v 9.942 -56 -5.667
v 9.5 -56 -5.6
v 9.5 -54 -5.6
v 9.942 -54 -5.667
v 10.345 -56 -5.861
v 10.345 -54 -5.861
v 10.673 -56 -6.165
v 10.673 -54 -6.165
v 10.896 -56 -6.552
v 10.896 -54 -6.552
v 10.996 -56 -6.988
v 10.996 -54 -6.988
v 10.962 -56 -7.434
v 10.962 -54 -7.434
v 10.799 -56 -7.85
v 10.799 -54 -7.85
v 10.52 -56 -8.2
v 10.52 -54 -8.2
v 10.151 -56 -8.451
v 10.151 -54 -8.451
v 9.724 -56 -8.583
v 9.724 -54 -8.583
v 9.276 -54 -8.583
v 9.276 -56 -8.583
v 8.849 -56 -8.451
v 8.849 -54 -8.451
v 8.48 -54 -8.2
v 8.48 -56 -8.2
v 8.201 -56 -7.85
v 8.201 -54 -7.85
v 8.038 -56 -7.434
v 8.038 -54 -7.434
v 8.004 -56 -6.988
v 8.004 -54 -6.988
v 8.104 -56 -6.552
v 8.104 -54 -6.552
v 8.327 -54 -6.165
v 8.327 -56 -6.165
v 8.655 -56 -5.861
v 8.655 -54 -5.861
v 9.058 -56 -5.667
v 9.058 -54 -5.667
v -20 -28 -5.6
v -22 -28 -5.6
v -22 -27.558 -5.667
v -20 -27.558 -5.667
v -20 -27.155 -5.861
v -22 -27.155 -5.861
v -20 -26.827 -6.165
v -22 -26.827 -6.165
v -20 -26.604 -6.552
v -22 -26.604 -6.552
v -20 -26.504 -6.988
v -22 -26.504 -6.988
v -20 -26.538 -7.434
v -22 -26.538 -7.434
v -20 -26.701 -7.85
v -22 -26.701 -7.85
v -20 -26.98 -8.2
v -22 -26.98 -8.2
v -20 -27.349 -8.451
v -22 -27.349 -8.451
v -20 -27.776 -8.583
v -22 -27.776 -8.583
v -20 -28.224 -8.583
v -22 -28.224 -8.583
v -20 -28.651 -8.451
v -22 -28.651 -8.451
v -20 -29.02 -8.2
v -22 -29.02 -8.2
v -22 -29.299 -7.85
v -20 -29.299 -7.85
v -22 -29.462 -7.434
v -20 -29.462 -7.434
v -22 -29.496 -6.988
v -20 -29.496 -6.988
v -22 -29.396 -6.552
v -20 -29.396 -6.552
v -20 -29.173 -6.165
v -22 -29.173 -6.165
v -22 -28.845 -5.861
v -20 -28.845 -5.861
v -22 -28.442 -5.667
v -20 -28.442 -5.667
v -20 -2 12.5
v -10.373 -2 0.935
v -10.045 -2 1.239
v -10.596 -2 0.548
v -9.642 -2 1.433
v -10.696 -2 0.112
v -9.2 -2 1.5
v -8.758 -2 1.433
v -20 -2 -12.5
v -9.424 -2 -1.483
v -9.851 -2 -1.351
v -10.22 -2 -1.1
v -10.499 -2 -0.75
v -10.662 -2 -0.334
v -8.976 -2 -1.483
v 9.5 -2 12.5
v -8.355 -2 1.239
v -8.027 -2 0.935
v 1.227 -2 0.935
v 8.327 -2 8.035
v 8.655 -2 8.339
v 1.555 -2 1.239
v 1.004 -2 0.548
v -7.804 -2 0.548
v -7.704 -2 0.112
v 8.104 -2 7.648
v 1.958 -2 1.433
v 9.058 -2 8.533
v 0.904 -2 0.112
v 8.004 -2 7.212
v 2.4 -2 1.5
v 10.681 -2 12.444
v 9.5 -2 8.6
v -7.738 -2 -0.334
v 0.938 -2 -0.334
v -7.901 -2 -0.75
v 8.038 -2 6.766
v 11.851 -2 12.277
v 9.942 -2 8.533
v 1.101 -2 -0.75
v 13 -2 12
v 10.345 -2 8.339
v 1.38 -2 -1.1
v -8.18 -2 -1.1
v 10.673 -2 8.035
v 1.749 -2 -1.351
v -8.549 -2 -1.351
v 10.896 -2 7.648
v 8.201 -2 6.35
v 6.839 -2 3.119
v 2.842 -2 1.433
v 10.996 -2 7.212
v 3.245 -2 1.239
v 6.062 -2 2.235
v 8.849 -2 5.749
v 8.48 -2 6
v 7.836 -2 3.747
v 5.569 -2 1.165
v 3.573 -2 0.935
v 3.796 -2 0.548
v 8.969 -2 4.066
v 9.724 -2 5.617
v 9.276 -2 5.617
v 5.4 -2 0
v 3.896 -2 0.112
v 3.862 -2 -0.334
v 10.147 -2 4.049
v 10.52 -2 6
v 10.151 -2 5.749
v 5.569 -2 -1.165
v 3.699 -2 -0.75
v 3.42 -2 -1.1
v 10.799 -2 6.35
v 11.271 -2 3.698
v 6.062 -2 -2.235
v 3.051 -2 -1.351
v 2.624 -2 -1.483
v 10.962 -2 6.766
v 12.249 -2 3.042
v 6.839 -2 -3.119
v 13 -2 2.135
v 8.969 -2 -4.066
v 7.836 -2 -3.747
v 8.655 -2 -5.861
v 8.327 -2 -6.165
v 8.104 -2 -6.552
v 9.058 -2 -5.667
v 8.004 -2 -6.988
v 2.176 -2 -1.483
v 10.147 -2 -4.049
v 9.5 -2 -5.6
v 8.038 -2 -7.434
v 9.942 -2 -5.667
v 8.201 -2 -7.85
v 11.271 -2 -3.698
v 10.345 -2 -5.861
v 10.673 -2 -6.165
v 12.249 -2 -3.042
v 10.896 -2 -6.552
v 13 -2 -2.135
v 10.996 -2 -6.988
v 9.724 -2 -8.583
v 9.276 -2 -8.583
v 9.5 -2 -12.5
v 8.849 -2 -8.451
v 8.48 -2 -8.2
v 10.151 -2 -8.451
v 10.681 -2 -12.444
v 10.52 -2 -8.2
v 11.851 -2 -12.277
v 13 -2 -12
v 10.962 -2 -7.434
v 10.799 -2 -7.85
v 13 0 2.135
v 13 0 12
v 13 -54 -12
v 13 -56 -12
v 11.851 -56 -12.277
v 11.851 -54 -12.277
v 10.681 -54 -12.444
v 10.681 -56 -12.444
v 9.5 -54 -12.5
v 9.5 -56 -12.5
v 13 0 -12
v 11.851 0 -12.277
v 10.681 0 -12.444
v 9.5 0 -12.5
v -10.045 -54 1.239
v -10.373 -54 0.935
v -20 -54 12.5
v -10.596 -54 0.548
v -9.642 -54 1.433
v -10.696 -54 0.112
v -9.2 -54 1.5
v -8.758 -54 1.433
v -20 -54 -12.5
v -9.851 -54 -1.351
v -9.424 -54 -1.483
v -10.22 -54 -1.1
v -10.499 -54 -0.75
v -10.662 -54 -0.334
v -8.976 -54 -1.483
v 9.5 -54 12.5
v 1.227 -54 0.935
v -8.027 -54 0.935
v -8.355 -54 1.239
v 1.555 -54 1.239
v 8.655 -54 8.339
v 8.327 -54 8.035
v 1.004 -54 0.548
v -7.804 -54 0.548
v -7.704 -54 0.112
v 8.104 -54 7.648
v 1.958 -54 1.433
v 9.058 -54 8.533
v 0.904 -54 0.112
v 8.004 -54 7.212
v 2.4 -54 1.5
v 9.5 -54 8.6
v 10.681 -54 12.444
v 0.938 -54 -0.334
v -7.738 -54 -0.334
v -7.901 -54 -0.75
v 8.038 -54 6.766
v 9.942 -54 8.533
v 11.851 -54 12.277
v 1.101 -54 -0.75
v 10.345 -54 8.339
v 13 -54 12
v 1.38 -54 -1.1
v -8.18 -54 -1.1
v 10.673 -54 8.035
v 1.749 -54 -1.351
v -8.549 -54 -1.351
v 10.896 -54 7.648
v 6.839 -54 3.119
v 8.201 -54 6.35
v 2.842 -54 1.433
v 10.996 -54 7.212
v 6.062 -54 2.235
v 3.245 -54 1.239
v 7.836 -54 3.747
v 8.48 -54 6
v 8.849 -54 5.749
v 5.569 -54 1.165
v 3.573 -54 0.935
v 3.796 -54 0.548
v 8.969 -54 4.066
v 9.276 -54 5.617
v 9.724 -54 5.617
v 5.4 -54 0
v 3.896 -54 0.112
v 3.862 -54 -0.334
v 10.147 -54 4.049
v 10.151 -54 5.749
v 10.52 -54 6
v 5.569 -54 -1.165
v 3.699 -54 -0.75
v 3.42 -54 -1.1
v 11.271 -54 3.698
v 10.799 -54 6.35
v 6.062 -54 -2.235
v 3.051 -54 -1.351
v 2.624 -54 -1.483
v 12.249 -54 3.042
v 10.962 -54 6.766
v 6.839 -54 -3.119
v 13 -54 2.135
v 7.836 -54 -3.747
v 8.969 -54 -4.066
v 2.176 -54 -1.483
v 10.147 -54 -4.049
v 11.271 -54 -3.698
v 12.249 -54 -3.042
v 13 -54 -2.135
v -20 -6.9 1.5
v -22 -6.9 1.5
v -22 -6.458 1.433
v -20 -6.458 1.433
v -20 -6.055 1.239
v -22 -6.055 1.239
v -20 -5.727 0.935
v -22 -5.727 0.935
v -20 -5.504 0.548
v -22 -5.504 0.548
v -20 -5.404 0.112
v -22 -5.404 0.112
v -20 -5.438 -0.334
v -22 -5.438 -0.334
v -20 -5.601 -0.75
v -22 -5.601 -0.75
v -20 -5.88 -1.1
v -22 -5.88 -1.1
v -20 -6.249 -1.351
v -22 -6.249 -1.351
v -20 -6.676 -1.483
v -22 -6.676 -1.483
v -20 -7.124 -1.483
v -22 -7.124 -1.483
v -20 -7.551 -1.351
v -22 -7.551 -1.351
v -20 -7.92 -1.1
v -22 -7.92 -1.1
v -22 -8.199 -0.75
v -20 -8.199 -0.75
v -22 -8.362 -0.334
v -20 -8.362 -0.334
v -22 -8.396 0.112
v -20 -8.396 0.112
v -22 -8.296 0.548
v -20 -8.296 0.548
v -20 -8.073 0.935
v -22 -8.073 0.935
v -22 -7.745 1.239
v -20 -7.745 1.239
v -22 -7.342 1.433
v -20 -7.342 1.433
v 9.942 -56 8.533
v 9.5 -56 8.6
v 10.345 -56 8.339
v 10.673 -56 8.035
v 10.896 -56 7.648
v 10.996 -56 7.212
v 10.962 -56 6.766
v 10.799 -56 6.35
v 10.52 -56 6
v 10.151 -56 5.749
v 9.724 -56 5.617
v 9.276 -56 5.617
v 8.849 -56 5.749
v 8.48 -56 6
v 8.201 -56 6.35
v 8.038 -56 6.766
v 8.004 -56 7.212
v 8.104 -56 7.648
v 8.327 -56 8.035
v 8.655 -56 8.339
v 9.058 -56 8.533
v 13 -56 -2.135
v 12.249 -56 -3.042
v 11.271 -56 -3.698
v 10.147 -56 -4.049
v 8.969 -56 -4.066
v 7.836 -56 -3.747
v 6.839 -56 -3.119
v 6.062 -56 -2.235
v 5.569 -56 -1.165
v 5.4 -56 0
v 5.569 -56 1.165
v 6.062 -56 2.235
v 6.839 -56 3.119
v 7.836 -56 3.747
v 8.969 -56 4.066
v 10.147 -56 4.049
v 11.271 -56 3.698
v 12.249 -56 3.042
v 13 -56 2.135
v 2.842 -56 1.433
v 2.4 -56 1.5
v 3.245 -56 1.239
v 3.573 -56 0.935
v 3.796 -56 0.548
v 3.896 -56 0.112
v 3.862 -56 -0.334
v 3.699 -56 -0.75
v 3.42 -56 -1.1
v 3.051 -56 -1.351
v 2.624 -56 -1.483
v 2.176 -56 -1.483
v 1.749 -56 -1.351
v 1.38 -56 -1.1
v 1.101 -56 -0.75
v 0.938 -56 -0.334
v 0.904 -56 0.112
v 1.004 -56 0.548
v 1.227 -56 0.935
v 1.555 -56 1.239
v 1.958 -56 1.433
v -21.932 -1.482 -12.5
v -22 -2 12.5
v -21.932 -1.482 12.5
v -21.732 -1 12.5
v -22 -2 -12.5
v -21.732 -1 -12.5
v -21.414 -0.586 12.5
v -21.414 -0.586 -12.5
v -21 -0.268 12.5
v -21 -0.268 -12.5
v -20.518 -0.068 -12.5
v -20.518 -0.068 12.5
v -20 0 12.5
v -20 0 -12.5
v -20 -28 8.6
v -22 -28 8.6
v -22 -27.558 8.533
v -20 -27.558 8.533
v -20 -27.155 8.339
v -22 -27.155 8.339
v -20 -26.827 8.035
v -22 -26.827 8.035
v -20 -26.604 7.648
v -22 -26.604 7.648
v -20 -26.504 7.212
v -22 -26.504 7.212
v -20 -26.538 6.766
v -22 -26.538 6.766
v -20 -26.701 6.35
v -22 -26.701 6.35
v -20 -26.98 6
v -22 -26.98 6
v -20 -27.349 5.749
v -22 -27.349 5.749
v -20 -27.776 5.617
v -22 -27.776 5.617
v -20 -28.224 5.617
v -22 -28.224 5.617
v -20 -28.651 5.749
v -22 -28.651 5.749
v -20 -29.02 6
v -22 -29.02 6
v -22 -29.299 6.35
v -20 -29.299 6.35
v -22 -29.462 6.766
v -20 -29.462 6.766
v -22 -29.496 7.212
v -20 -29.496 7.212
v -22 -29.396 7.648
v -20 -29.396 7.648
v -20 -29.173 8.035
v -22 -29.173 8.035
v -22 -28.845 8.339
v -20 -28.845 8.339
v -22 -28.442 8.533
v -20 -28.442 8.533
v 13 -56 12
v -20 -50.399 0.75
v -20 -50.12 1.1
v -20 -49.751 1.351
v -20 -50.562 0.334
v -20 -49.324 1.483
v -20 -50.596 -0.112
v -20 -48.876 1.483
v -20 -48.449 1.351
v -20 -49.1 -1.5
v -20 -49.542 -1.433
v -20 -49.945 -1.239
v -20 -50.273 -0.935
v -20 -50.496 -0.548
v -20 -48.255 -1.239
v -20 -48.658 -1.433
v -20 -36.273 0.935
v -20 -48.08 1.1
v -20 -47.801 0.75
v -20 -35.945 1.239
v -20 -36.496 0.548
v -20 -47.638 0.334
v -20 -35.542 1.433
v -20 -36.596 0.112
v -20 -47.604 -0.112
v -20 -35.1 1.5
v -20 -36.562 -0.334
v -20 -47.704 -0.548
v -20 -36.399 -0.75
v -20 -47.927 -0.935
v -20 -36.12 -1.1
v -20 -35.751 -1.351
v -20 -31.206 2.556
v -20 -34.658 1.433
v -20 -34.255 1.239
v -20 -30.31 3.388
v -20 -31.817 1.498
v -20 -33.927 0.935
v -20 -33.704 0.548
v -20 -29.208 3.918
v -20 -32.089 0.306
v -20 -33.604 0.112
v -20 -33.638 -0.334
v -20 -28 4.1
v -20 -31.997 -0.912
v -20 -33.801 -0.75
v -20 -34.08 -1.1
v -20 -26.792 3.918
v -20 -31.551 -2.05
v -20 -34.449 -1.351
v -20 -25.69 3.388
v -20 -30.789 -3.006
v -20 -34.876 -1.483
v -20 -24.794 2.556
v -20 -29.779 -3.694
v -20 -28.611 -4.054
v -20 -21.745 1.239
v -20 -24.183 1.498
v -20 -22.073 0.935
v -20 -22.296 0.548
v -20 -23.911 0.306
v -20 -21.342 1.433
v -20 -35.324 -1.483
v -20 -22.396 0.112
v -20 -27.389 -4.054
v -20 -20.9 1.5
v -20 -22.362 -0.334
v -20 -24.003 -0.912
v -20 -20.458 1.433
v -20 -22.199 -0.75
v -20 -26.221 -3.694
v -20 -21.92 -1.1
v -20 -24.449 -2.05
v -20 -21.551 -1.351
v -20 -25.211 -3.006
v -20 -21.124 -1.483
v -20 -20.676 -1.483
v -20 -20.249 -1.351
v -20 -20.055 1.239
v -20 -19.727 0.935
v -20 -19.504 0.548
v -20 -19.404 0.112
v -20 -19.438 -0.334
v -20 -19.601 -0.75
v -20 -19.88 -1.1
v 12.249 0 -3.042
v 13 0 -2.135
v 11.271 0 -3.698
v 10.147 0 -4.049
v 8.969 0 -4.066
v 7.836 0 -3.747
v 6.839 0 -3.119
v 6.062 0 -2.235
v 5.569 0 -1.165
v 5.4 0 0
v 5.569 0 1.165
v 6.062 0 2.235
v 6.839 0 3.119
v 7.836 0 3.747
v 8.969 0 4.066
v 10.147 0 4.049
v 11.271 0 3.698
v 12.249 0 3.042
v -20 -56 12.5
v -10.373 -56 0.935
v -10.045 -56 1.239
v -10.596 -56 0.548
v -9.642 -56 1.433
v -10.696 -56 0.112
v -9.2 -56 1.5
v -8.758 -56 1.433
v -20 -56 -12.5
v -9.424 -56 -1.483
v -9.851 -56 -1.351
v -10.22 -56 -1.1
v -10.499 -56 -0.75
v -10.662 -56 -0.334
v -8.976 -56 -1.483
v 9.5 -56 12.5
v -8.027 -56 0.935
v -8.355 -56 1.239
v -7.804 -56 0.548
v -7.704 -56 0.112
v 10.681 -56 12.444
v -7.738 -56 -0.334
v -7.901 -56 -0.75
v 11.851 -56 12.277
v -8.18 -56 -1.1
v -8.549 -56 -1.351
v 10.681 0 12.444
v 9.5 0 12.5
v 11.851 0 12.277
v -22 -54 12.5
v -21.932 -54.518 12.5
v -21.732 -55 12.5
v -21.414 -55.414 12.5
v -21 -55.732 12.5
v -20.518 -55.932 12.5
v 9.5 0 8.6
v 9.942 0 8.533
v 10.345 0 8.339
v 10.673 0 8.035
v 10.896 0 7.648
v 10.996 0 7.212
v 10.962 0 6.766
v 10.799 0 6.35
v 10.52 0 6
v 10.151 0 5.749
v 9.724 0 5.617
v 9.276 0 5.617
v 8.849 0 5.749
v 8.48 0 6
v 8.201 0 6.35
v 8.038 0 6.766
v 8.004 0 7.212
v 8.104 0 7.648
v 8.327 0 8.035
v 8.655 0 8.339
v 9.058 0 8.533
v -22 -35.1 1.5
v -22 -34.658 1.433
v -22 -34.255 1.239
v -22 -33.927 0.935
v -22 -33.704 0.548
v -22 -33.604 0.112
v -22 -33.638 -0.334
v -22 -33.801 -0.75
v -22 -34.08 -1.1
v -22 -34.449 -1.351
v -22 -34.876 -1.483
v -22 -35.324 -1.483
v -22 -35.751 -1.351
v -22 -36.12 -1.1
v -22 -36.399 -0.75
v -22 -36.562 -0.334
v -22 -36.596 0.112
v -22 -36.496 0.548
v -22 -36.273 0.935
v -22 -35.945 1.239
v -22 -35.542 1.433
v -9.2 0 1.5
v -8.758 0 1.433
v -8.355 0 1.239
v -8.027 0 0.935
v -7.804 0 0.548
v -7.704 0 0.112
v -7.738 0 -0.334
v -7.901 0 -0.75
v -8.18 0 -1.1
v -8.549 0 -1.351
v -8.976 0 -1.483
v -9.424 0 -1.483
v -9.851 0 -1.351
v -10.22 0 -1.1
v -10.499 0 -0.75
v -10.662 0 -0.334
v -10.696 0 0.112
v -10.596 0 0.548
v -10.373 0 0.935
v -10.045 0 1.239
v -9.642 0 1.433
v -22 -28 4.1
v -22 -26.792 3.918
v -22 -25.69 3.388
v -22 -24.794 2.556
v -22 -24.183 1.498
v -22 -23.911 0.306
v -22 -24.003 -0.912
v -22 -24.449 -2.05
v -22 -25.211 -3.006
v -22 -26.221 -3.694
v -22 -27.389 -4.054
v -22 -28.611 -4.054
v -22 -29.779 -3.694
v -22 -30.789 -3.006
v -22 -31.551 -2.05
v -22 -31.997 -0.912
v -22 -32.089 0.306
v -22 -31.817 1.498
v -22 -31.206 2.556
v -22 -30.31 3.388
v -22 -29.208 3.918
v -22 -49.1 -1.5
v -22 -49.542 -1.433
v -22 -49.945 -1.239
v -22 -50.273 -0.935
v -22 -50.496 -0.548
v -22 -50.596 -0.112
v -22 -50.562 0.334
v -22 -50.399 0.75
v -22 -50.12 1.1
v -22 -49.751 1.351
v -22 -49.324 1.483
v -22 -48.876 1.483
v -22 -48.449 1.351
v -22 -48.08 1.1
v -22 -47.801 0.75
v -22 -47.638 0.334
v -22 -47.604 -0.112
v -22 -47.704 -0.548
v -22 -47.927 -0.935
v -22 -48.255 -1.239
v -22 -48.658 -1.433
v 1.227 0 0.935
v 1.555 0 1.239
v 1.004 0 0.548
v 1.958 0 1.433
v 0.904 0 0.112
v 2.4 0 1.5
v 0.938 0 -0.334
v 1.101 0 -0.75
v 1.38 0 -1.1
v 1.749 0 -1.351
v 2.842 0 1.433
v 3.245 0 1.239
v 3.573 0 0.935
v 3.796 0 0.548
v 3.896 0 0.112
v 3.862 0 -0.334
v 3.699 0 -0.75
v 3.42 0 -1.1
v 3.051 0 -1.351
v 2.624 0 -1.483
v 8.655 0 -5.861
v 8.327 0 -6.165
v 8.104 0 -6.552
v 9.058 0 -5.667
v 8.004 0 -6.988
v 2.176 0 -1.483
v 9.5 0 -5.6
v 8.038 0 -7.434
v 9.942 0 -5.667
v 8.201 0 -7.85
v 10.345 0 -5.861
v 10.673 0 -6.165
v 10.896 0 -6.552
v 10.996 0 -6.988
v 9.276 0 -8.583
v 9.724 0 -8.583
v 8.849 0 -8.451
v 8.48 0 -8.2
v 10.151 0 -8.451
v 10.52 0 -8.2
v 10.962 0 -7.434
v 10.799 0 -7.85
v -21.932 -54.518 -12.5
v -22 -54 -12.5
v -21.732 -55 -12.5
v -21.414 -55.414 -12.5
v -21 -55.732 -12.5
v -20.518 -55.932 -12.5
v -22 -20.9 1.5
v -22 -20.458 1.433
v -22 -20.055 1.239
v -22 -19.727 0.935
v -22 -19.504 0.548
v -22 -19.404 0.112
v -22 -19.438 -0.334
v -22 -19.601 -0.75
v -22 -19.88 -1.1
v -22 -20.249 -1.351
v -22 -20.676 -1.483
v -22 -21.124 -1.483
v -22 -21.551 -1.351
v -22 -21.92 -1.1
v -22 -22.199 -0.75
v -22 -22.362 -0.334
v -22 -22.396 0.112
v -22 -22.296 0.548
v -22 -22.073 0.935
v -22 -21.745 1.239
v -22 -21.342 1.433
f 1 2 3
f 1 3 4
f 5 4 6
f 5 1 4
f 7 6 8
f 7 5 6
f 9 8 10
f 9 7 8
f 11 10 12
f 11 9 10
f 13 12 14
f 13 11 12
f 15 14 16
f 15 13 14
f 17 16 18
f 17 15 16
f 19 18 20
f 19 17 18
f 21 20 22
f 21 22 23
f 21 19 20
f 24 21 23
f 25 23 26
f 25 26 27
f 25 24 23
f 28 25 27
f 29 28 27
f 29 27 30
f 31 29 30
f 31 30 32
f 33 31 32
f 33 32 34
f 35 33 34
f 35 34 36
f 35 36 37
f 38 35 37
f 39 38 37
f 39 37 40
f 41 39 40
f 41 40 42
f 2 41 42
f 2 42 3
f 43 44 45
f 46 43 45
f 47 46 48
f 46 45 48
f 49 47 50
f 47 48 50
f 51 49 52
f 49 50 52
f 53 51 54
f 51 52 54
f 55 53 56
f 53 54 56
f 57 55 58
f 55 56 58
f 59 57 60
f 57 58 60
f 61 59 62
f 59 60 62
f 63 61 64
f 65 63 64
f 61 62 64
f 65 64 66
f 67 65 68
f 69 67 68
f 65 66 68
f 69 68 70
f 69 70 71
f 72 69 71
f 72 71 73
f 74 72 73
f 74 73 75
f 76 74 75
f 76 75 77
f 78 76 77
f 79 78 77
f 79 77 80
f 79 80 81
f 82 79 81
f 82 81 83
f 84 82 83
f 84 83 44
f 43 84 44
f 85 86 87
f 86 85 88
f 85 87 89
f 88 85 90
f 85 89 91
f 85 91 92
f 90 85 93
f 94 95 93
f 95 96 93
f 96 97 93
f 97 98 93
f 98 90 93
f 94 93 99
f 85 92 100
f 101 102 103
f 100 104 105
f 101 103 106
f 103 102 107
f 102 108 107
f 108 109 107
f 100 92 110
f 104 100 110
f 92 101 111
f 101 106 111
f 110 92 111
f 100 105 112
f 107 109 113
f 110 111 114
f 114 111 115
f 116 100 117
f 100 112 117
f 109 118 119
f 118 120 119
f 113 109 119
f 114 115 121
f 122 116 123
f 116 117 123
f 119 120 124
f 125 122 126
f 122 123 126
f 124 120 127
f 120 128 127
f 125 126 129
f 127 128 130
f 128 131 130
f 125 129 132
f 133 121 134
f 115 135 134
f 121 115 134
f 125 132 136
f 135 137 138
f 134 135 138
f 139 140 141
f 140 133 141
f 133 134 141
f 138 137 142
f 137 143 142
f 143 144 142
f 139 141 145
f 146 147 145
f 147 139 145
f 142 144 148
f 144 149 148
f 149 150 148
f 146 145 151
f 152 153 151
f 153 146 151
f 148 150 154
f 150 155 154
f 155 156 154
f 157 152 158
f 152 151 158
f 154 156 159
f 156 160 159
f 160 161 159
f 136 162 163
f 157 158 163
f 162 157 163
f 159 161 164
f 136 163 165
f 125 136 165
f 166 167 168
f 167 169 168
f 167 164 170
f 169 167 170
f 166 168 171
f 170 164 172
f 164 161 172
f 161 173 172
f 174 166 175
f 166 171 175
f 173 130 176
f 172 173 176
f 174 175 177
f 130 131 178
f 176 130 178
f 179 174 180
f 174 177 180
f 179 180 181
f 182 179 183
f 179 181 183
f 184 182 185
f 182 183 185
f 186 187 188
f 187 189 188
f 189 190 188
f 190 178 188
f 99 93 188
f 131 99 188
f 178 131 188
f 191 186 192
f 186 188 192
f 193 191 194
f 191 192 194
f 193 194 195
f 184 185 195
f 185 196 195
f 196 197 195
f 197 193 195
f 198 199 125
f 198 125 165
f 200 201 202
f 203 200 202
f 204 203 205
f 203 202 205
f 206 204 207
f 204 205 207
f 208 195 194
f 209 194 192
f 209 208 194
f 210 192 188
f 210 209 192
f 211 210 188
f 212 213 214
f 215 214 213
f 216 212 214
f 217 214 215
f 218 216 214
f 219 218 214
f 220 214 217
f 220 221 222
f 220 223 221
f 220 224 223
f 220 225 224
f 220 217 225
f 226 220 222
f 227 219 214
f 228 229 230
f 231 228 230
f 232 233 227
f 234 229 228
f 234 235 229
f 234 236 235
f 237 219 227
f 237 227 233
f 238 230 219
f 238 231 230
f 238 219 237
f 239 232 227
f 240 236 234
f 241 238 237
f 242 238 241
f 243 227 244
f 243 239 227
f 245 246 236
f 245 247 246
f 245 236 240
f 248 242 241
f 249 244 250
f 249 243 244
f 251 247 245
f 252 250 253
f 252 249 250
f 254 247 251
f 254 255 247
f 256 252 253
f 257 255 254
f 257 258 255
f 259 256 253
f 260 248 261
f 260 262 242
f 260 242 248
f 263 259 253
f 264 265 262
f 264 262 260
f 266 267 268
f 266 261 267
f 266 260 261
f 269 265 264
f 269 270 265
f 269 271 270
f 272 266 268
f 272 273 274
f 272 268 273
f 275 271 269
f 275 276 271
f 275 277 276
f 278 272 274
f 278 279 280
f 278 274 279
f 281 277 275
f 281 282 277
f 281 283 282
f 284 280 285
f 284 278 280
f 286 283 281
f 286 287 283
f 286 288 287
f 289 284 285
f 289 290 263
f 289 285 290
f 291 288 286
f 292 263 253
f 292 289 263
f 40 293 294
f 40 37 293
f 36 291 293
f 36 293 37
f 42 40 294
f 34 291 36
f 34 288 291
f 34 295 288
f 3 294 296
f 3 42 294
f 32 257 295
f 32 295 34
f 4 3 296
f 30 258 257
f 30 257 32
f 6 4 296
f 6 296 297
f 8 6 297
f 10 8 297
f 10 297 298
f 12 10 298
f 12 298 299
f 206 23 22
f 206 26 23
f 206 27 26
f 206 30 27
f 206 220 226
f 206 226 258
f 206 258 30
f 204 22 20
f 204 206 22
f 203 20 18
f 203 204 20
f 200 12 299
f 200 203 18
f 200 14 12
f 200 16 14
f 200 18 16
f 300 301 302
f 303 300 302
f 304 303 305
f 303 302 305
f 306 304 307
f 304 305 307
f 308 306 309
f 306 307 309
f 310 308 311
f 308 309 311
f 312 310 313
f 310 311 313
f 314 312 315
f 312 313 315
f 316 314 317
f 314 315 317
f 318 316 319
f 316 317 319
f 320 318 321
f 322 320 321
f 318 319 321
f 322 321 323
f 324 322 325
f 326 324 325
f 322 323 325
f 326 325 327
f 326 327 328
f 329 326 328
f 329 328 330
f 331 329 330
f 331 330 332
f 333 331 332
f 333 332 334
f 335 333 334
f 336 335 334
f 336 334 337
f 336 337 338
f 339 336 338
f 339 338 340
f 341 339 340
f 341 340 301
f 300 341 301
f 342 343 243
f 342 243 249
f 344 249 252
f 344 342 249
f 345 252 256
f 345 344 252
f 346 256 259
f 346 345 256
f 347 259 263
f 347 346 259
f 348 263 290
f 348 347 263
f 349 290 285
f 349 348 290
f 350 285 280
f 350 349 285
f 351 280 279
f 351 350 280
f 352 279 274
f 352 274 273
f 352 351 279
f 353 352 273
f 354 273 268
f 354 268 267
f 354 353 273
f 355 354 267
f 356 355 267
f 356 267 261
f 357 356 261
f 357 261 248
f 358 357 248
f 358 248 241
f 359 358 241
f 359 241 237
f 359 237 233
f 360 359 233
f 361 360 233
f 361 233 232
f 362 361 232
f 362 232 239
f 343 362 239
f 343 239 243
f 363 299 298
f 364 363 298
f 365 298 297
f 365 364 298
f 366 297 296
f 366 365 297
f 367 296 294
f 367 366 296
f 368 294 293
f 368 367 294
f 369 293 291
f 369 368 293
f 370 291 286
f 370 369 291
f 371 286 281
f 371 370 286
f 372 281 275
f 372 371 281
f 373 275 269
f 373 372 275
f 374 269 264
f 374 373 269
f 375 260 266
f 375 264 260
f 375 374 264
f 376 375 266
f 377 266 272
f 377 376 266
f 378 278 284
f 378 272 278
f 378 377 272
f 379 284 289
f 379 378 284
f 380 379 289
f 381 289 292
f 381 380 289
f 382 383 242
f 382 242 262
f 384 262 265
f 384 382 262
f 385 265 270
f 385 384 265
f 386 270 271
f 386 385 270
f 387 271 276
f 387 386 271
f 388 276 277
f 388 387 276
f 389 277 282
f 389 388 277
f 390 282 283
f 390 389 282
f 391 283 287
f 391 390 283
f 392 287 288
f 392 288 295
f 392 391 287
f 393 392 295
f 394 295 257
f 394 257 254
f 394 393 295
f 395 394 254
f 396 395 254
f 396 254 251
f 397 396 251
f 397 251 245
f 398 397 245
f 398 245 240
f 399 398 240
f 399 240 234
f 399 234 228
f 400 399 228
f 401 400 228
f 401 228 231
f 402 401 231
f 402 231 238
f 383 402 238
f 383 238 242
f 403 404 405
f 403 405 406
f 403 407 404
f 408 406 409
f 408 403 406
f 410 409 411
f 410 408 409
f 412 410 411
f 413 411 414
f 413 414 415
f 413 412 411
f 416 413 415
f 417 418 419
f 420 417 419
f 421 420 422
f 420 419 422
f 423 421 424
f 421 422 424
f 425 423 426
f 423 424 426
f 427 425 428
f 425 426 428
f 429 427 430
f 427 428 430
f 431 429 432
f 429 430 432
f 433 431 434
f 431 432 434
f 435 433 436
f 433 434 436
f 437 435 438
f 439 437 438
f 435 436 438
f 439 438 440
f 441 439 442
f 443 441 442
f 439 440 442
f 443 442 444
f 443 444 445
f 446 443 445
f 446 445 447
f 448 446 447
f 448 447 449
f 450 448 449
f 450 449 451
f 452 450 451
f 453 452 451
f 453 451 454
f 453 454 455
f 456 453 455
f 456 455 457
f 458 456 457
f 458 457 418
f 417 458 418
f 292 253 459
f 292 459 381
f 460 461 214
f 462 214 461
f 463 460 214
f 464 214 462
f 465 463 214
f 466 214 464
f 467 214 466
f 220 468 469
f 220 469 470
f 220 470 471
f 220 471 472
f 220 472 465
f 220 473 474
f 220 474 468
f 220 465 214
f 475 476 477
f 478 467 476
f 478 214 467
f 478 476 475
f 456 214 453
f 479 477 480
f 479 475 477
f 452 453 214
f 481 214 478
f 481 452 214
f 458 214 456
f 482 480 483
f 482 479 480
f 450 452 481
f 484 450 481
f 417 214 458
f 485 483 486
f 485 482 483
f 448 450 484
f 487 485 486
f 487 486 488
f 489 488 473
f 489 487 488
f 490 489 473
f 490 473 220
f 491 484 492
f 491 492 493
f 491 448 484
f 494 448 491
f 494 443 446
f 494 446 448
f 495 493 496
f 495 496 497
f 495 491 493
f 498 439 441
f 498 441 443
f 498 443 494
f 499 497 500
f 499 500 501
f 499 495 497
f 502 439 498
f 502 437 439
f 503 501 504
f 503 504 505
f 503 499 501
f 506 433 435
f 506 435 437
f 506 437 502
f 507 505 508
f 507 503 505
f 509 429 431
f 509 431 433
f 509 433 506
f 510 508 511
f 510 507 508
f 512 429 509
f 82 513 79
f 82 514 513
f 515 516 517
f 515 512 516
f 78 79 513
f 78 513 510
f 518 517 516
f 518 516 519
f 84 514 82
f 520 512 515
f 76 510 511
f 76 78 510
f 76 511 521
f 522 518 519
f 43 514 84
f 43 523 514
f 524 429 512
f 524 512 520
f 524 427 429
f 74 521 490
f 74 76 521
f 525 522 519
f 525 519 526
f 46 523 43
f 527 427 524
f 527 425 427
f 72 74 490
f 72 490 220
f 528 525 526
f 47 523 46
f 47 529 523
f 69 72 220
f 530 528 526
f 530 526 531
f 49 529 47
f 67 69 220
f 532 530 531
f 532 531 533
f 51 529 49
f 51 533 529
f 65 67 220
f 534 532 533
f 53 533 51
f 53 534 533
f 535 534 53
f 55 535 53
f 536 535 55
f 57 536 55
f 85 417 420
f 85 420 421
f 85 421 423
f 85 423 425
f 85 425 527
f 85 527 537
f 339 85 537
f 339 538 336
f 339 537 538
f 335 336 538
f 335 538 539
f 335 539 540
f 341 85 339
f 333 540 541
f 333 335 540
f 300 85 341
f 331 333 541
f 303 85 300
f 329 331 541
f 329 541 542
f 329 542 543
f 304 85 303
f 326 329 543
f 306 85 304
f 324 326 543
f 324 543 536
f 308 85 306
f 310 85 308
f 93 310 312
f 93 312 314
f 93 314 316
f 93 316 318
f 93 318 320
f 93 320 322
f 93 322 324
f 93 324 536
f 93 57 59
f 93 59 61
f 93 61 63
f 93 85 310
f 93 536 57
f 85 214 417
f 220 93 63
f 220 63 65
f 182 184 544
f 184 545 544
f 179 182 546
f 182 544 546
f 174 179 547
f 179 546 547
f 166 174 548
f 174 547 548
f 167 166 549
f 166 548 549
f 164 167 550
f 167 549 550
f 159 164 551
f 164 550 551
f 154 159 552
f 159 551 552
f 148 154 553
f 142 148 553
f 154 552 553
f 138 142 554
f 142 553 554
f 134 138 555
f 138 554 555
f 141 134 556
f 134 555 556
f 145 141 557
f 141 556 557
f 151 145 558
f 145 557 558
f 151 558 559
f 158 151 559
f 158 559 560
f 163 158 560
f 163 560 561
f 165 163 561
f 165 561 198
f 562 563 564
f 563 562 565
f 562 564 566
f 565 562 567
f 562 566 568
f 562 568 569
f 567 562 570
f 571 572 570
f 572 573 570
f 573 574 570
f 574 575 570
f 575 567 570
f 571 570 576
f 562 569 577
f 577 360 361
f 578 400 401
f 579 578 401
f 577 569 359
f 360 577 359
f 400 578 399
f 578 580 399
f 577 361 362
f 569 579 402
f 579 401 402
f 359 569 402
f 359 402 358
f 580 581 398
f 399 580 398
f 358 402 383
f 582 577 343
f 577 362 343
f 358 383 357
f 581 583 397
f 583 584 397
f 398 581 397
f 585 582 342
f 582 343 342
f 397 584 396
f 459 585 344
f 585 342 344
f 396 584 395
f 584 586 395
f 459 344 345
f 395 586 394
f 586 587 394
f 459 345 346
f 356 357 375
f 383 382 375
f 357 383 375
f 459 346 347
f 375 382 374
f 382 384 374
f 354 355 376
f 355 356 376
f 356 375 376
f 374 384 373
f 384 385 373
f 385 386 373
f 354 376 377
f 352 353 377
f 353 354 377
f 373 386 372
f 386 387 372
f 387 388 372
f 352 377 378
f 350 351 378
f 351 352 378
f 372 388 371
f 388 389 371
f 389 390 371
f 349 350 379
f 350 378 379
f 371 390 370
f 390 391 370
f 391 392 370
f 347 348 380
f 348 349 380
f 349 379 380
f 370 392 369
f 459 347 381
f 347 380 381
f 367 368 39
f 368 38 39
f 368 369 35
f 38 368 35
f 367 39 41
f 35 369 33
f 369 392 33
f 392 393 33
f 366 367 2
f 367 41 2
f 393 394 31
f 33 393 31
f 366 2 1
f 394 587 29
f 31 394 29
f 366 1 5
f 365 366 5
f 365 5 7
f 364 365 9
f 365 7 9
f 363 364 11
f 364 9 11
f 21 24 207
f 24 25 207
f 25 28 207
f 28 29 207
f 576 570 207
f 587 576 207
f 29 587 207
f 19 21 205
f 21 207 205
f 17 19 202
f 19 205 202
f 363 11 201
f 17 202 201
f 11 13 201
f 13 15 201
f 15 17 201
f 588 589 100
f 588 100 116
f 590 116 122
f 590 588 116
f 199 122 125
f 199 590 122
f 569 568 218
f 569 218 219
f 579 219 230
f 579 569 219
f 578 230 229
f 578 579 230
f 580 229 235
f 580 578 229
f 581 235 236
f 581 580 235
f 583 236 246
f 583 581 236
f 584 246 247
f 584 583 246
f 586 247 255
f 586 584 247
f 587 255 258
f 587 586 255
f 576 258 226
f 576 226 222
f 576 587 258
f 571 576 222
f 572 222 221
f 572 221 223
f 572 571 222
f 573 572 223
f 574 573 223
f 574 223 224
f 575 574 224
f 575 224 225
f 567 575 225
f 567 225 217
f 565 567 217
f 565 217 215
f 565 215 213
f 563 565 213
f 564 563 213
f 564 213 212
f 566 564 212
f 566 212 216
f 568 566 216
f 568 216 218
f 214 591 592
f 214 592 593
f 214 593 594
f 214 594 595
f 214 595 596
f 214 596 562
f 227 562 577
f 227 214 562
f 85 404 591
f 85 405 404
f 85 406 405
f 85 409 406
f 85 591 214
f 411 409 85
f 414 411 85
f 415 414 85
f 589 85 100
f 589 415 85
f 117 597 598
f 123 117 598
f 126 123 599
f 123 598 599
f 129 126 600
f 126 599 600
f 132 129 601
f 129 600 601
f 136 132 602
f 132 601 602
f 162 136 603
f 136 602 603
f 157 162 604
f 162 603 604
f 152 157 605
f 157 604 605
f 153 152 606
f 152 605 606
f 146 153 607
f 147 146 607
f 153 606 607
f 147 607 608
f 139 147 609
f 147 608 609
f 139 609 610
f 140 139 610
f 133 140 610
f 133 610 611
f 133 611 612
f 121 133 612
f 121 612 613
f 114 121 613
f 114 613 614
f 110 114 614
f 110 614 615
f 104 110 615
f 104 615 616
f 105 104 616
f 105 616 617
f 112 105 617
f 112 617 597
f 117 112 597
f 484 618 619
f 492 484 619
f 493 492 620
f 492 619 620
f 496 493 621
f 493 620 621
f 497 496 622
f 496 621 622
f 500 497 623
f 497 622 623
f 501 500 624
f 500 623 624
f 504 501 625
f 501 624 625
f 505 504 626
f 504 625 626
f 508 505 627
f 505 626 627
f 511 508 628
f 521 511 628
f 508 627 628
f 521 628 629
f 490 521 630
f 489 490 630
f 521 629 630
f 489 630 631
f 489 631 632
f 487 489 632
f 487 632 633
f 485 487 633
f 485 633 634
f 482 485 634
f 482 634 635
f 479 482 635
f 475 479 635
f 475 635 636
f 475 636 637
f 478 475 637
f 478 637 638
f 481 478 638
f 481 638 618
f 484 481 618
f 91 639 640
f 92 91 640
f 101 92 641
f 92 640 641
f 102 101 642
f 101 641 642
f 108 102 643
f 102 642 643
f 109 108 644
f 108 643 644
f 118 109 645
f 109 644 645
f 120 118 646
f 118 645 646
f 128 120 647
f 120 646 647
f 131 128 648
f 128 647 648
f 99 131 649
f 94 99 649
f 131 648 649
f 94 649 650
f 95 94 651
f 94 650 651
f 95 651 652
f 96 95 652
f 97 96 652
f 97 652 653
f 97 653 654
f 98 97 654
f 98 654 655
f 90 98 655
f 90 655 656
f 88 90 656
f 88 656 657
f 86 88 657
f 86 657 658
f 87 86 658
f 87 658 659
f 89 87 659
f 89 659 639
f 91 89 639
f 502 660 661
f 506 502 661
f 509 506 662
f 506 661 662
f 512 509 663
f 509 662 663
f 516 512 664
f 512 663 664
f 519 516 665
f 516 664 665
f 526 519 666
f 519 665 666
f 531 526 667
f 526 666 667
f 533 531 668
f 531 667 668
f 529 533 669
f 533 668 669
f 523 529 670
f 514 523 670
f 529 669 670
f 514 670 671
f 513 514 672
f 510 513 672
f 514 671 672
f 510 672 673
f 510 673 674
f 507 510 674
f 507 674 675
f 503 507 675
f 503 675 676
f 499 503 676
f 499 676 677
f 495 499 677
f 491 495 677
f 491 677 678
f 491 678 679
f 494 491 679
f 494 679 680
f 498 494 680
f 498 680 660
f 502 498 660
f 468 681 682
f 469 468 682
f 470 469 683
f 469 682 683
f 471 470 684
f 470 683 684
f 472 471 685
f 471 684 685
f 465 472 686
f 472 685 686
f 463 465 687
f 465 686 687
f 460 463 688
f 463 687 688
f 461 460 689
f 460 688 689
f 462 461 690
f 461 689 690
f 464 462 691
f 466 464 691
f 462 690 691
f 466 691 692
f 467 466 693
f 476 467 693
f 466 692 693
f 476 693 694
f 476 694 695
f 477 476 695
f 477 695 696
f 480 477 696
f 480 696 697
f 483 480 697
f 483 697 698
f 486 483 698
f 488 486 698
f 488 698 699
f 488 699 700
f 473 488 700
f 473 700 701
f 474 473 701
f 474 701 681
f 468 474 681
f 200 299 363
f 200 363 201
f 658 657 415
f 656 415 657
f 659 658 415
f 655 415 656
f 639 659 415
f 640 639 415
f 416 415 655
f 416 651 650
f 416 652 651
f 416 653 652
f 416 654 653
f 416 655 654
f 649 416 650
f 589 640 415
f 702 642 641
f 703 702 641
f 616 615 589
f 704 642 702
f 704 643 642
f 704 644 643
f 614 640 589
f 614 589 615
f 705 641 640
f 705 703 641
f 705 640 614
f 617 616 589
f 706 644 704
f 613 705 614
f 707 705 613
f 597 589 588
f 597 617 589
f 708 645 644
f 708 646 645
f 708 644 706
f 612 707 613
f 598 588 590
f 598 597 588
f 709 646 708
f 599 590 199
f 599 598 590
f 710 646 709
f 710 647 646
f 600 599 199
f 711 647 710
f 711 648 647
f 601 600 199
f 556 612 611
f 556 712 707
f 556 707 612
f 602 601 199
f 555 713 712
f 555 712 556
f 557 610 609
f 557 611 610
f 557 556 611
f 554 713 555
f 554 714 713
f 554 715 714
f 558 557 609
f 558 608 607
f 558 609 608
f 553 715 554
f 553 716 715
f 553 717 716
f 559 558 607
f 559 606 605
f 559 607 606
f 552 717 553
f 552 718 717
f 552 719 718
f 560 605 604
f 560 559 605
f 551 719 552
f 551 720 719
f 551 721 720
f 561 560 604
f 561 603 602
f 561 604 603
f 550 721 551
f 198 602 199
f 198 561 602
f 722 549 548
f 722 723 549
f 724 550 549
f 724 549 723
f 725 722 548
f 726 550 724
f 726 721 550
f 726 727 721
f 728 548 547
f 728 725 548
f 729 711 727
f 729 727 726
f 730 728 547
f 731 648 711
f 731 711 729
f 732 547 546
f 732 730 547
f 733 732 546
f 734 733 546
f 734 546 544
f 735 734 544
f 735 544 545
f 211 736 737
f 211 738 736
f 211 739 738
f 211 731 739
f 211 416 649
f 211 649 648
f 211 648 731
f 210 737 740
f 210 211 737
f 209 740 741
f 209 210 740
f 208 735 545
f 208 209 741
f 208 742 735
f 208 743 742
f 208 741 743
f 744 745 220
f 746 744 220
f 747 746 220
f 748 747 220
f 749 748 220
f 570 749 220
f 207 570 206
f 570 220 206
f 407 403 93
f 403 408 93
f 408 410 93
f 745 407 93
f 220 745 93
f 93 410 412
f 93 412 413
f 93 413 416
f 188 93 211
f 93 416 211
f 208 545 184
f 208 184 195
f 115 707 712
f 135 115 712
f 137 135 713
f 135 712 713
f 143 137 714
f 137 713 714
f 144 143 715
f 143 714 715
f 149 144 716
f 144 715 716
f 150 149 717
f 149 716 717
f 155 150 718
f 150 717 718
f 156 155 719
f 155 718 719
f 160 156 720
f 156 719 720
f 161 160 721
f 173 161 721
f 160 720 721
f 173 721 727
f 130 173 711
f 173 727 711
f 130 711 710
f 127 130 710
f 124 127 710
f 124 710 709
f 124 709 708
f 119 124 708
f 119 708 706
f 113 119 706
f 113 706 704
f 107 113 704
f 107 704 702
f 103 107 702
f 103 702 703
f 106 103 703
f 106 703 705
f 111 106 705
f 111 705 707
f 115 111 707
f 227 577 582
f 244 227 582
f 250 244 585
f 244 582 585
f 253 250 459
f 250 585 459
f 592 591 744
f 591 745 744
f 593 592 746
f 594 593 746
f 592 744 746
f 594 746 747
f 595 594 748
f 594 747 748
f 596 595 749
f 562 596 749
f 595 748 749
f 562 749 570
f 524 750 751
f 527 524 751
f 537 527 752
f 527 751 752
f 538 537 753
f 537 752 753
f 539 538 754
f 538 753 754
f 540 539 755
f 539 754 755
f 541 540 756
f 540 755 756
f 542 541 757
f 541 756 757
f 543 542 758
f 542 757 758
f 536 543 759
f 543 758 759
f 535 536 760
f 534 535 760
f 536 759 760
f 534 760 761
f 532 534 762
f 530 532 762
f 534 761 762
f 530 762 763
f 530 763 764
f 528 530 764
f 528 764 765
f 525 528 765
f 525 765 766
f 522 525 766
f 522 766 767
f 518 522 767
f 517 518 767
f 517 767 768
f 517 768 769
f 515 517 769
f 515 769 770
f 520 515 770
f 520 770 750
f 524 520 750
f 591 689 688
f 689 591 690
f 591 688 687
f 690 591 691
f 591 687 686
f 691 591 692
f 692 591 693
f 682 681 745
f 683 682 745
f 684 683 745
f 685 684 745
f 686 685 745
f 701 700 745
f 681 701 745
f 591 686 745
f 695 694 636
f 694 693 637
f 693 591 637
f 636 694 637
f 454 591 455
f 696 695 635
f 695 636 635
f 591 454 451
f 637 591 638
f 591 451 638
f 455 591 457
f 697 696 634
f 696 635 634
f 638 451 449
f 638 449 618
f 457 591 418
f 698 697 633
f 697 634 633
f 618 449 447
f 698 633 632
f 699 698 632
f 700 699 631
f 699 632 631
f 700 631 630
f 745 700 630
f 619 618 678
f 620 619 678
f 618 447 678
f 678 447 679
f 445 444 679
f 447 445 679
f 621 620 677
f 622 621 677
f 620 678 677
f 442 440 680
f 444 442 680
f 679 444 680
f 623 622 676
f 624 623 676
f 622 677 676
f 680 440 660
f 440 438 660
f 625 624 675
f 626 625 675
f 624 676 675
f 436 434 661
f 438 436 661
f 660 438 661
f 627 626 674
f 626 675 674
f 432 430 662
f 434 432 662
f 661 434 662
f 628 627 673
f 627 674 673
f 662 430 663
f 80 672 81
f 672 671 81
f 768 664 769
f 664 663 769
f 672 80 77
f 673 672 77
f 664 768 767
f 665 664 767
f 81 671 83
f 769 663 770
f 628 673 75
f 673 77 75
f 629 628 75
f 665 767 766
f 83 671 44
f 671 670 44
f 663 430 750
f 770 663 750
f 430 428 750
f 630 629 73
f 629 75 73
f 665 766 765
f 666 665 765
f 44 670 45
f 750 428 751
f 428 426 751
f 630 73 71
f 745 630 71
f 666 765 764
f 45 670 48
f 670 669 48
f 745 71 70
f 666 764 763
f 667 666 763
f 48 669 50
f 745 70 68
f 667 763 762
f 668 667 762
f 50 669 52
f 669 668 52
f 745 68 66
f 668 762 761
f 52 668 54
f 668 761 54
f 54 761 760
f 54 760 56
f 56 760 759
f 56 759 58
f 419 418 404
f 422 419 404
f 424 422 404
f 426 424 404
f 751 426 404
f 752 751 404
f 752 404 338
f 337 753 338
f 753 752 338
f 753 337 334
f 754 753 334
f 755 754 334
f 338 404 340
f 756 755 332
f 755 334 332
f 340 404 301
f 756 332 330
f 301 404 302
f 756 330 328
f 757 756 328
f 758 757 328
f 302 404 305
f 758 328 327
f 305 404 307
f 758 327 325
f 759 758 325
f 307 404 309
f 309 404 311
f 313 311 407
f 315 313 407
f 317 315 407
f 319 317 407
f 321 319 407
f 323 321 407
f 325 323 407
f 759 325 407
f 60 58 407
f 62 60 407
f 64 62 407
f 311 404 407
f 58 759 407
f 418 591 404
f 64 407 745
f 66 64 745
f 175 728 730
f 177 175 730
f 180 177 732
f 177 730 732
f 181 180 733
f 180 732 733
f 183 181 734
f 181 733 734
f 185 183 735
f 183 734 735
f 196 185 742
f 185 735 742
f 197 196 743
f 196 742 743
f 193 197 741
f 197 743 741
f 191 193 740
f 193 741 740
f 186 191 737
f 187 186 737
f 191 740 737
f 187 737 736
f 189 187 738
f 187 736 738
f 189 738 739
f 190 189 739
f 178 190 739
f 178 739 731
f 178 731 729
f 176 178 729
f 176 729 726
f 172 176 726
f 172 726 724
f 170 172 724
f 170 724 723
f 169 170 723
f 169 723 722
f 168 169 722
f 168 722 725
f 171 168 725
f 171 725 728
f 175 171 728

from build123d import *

# Parameters (mm, degrees)
SKETCH_1_W          = 44
SKETCH_1_H          = 25
EXTRUDE_1_DEPTH     = 2
SKETCH_2_W          = 2
SKETCH_2_H          = 25
EXTRUDE_2_DEPTH     = 56
FILLET_1_RADIUS     = 12.5
FILLET_1_LENGTH     = 2
CUT_EXTRUDE_2_REACH = 63.451
SKETCH_3_R          = 4.1
SKETCH_3_R_2        = 1.5
CUT_EXTRUDE_3_REACH = 74.307
SKETCH_4_R          = 4.1
SKETCH_4_R_2        = 1.5
FILLET_2_R          = 2
SKETCH_5_W          = 11
SKETCH_5_H          = 30
CUT_EXTRUDE_4_DEPTH = 62.451200151


with BuildPart() as part:
    # 草图1 → 凸台-拉伸1 (new body)
    with BuildSketch(Plane(origin=(0, 0, 0), x_dir=(1, 0, 0), z_dir=(0, 1, 0))):
        Rectangle(SKETCH_1_W, SKETCH_1_H)
    extrude(amount=-EXTRUDE_1_DEPTH)

    # 草图2 → 凸台-拉伸2 (add)
    with BuildSketch(Plane(origin=(0, 0, 0), x_dir=(1, 0, 0), z_dir=(0, 1, 0))):
        with Locations((-21, 0)):
            Rectangle(SKETCH_2_W, SKETCH_2_H)
    extrude(amount=-EXTRUDE_2_DEPTH)

    # 圆角1: full round fillet: the end face becomes a half cylinder, R = half its width
    fillet_1_face = Plane((22, -1, 0), x_dir=(0, 1, 0), z_dir=(1, 0, 0))  # on the end face: x along it, z out of the body
    fillet_1_slab = fillet_1_face.offset(-FILLET_1_RADIUS / 2) * Box(FILLET_1_LENGTH, 2 * FILLET_1_RADIUS, FILLET_1_RADIUS, mode=Mode.PRIVATE)  # the body's end, R deep
    fillet_1_round = Plane((9.5, -1, 0), x_dir=(1, 0, 0), z_dir=(0, 1, 0)) * Cylinder(FILLET_1_RADIUS, FILLET_1_LENGTH, mode=Mode.PRIVATE)  # its axis R under the face
    add(fillet_1_slab - fillet_1_round, mode=Mode.SUBTRACT)

    # 草图3 → 切除-拉伸2 (cut, up to next)
    with BuildSketch(Plane(origin=(0, 0, 0), x_dir=(1, 0, 0), z_dir=(0, 1, 0)), mode=Mode.PRIVATE) as cut_extrude_2_sk1:
        with Locations(Location((9.5, 0, 0), (0, 0, 270))):
            Circle(SKETCH_3_R)
    cut_extrude_2_tool1 = extrude(cut_extrude_2_sk1.sketch, amount=-CUT_EXTRUDE_2_REACH, mode=Mode.PRIVATE) & part.part
    # 草图3 → 切除-拉伸2 (cut, up to next)
    with BuildSketch(Plane(origin=(0, 0, 0), x_dir=(1, 0, 0), z_dir=(0, 1, 0)), mode=Mode.PRIVATE) as cut_extrude_2_sk2:
        with Locations(Location((2.4, 0, 0), (0, 0, 270))):
            Circle(SKETCH_3_R_2)
    cut_extrude_2_tool2 = extrude(cut_extrude_2_sk2.sketch, amount=-CUT_EXTRUDE_2_REACH, mode=Mode.PRIVATE) & part.part
    # 草图3 → 切除-拉伸2 (cut, up to next)
    with BuildSketch(Plane(origin=(0, 0, 0), x_dir=(1, 0, 0), z_dir=(0, 1, 0)), mode=Mode.PRIVATE) as cut_extrude_2_sk3:
        with Locations(Location((9.5, 7.1, 0), (0, 0, 270))):
            Circle(SKETCH_3_R_2)
    cut_extrude_2_tool3 = extrude(cut_extrude_2_sk3.sketch, amount=-CUT_EXTRUDE_2_REACH, mode=Mode.PRIVATE) & part.part
    # 草图3 → 切除-拉伸2 (cut, up to next)
    with BuildSketch(Plane(origin=(0, 0, 0), x_dir=(1, 0, 0), z_dir=(0, 1, 0)), mode=Mode.PRIVATE) as cut_extrude_2_sk4:
        with Locations(Location((16.6, 0, 0), (0, 0, 270))):
            Circle(SKETCH_3_R_2)
    cut_extrude_2_tool4 = extrude(cut_extrude_2_sk4.sketch, amount=-CUT_EXTRUDE_2_REACH, mode=Mode.PRIVATE) & part.part
    # 草图3 → 切除-拉伸2 (cut, up to next)
    with BuildSketch(Plane(origin=(0, 0, 0), x_dir=(1, 0, 0), z_dir=(0, 1, 0)), mode=Mode.PRIVATE) as cut_extrude_2_sk5:
        with Locations(Location((9.5, -7.1, 0), (0, 0, 270))):
            Circle(SKETCH_3_R_2)
    cut_extrude_2_tool5 = extrude(cut_extrude_2_sk5.sketch, amount=-CUT_EXTRUDE_2_REACH, mode=Mode.PRIVATE) & part.part
    # 草图3 → 切除-拉伸2 (cut, up to next)
    with BuildSketch(Plane(origin=(0, 0, 0), x_dir=(1, 0, 0), z_dir=(0, 1, 0)), mode=Mode.PRIVATE) as cut_extrude_2_sk6:
        with Locations(Location((-9.2, 0, 0), (0, 0, 270))):
            Circle(SKETCH_3_R_2)
    cut_extrude_2_tool6 = extrude(cut_extrude_2_sk6.sketch, amount=-CUT_EXTRUDE_2_REACH, mode=Mode.PRIVATE) & part.part
    add(cut_extrude_2_tool1.solids().sort_by_distance((9.5, 0, 0))[0], mode=Mode.SUBTRACT)
    add(cut_extrude_2_tool2.solids().sort_by_distance((2.4, 0, 0))[0], mode=Mode.SUBTRACT)
    add(cut_extrude_2_tool3.solids().sort_by_distance((9.5, 0, -7.1))[0], mode=Mode.SUBTRACT)
    add(cut_extrude_2_tool4.solids().sort_by_distance((16.6, 0, 0))[0], mode=Mode.SUBTRACT)
    add(cut_extrude_2_tool5.solids().sort_by_distance((9.5, 0, 7.1))[0], mode=Mode.SUBTRACT)
    add(cut_extrude_2_tool6.solids().sort_by_distance((-9.2, 0, 0))[0], mode=Mode.SUBTRACT)

    # 镜向2: part across plane


with BuildPart() as part_1:
    add(part.part)
    add(part.part.mirror(Plane.ZX.offset(-28)))

    # 草图4 → 切除-拉伸3 (cut, up to next)
    with BuildSketch(Plane.ZY.offset(22), mode=Mode.PRIVATE) as cut_extrude_3_sk1:
        with Locations((0, -28)):
            Circle(SKETCH_4_R)
    cut_extrude_3_tool1 = extrude(cut_extrude_3_sk1.sketch, amount=-CUT_EXTRUDE_3_REACH, mode=Mode.PRIVATE) & part_1.part
    # 草图4 → 切除-拉伸3 (cut, up to next)
    with BuildSketch(Plane.ZY.offset(22), mode=Mode.PRIVATE) as cut_extrude_3_sk2:
        with Locations((0, -20.9)):
            Circle(SKETCH_4_R_2)
    cut_extrude_3_tool2 = extrude(cut_extrude_3_sk2.sketch, amount=-CUT_EXTRUDE_3_REACH, mode=Mode.PRIVATE) & part_1.part
    # 草图4 → 切除-拉伸3 (cut, up to next)
    with BuildSketch(Plane.ZY.offset(22), mode=Mode.PRIVATE) as cut_extrude_3_sk3:
        with Locations((7.1, -28)):
            Circle(SKETCH_4_R_2)
    cut_extrude_3_tool3 = extrude(cut_extrude_3_sk3.sketch, amount=-CUT_EXTRUDE_3_REACH, mode=Mode.PRIVATE) & part_1.part
    # 草图4 → 切除-拉伸3 (cut, up to next)
    with BuildSketch(Plane.ZY.offset(22), mode=Mode.PRIVATE) as cut_extrude_3_sk4:
        with Locations((0, -35.1)):
            Circle(SKETCH_4_R_2)
    cut_extrude_3_tool4 = extrude(cut_extrude_3_sk4.sketch, amount=-CUT_EXTRUDE_3_REACH, mode=Mode.PRIVATE) & part_1.part
    # 草图4 → 切除-拉伸3 (cut, up to next)
    with BuildSketch(Plane.ZY.offset(22), mode=Mode.PRIVATE) as cut_extrude_3_sk5:
        with Locations((-7.1, -28)):
            Circle(SKETCH_4_R_2)
    cut_extrude_3_tool5 = extrude(cut_extrude_3_sk5.sketch, amount=-CUT_EXTRUDE_3_REACH, mode=Mode.PRIVATE) & part_1.part
    # 草图4 → 切除-拉伸3 (cut, up to next)
    with BuildSketch(Plane.ZY.offset(22), mode=Mode.PRIVATE) as cut_extrude_3_sk6:
        with Locations((0, -6.9)):
            Circle(SKETCH_4_R_2)
    cut_extrude_3_tool6 = extrude(cut_extrude_3_sk6.sketch, amount=-CUT_EXTRUDE_3_REACH, mode=Mode.PRIVATE) & part_1.part
    # 草图4 → 切除-拉伸3 (cut, up to next)
    with BuildSketch(Plane.ZY.offset(22), mode=Mode.PRIVATE) as cut_extrude_3_sk7:
        with Locations(Location((0, -49.1, 0), (0, 0, 180))):
            Circle(SKETCH_4_R_2)
    cut_extrude_3_tool7 = extrude(cut_extrude_3_sk7.sketch, amount=-CUT_EXTRUDE_3_REACH, mode=Mode.PRIVATE) & part_1.part
    add(cut_extrude_3_tool1.solids().sort_by_distance((-22, -28, 0))[0], mode=Mode.SUBTRACT)
    add(cut_extrude_3_tool2.solids().sort_by_distance((-22, -20.9, 0))[0], mode=Mode.SUBTRACT)
    add(cut_extrude_3_tool3.solids().sort_by_distance((-22, -28, 7.1))[0], mode=Mode.SUBTRACT)
    add(cut_extrude_3_tool4.solids().sort_by_distance((-22, -35.1, 0))[0], mode=Mode.SUBTRACT)
    add(cut_extrude_3_tool5.solids().sort_by_distance((-22, -28, -7.1))[0], mode=Mode.SUBTRACT)
    add(cut_extrude_3_tool6.solids().sort_by_distance((-22, -6.9, 0))[0], mode=Mode.SUBTRACT)
    add(cut_extrude_3_tool7.solids().sort_by_distance((-22, -49.1, 0))[0], mode=Mode.SUBTRACT)

    # 圆角2
    fillet_2_edges = [part_1.edges().sort_by_distance(p)[0] for p in [
        (-22, -56, 0),
        (-22, 0, 0),
    ]]
    fillet(fillet_2_edges, radius=FILLET_2_R)

    # 草图5 → 切除-拉伸4 (cut, through all)
    with BuildSketch(Plane(origin=(0, 0, 0), x_dir=(1, 0, 0), z_dir=(0, 1, 0))):
        with Locations((18.5, 0)):
            Rectangle(SKETCH_5_W, SKETCH_5_H)
    extrude(amount=-CUT_EXTRUDE_4_DEPTH, mode=Mode.SUBTRACT)


solid = part_1.part
